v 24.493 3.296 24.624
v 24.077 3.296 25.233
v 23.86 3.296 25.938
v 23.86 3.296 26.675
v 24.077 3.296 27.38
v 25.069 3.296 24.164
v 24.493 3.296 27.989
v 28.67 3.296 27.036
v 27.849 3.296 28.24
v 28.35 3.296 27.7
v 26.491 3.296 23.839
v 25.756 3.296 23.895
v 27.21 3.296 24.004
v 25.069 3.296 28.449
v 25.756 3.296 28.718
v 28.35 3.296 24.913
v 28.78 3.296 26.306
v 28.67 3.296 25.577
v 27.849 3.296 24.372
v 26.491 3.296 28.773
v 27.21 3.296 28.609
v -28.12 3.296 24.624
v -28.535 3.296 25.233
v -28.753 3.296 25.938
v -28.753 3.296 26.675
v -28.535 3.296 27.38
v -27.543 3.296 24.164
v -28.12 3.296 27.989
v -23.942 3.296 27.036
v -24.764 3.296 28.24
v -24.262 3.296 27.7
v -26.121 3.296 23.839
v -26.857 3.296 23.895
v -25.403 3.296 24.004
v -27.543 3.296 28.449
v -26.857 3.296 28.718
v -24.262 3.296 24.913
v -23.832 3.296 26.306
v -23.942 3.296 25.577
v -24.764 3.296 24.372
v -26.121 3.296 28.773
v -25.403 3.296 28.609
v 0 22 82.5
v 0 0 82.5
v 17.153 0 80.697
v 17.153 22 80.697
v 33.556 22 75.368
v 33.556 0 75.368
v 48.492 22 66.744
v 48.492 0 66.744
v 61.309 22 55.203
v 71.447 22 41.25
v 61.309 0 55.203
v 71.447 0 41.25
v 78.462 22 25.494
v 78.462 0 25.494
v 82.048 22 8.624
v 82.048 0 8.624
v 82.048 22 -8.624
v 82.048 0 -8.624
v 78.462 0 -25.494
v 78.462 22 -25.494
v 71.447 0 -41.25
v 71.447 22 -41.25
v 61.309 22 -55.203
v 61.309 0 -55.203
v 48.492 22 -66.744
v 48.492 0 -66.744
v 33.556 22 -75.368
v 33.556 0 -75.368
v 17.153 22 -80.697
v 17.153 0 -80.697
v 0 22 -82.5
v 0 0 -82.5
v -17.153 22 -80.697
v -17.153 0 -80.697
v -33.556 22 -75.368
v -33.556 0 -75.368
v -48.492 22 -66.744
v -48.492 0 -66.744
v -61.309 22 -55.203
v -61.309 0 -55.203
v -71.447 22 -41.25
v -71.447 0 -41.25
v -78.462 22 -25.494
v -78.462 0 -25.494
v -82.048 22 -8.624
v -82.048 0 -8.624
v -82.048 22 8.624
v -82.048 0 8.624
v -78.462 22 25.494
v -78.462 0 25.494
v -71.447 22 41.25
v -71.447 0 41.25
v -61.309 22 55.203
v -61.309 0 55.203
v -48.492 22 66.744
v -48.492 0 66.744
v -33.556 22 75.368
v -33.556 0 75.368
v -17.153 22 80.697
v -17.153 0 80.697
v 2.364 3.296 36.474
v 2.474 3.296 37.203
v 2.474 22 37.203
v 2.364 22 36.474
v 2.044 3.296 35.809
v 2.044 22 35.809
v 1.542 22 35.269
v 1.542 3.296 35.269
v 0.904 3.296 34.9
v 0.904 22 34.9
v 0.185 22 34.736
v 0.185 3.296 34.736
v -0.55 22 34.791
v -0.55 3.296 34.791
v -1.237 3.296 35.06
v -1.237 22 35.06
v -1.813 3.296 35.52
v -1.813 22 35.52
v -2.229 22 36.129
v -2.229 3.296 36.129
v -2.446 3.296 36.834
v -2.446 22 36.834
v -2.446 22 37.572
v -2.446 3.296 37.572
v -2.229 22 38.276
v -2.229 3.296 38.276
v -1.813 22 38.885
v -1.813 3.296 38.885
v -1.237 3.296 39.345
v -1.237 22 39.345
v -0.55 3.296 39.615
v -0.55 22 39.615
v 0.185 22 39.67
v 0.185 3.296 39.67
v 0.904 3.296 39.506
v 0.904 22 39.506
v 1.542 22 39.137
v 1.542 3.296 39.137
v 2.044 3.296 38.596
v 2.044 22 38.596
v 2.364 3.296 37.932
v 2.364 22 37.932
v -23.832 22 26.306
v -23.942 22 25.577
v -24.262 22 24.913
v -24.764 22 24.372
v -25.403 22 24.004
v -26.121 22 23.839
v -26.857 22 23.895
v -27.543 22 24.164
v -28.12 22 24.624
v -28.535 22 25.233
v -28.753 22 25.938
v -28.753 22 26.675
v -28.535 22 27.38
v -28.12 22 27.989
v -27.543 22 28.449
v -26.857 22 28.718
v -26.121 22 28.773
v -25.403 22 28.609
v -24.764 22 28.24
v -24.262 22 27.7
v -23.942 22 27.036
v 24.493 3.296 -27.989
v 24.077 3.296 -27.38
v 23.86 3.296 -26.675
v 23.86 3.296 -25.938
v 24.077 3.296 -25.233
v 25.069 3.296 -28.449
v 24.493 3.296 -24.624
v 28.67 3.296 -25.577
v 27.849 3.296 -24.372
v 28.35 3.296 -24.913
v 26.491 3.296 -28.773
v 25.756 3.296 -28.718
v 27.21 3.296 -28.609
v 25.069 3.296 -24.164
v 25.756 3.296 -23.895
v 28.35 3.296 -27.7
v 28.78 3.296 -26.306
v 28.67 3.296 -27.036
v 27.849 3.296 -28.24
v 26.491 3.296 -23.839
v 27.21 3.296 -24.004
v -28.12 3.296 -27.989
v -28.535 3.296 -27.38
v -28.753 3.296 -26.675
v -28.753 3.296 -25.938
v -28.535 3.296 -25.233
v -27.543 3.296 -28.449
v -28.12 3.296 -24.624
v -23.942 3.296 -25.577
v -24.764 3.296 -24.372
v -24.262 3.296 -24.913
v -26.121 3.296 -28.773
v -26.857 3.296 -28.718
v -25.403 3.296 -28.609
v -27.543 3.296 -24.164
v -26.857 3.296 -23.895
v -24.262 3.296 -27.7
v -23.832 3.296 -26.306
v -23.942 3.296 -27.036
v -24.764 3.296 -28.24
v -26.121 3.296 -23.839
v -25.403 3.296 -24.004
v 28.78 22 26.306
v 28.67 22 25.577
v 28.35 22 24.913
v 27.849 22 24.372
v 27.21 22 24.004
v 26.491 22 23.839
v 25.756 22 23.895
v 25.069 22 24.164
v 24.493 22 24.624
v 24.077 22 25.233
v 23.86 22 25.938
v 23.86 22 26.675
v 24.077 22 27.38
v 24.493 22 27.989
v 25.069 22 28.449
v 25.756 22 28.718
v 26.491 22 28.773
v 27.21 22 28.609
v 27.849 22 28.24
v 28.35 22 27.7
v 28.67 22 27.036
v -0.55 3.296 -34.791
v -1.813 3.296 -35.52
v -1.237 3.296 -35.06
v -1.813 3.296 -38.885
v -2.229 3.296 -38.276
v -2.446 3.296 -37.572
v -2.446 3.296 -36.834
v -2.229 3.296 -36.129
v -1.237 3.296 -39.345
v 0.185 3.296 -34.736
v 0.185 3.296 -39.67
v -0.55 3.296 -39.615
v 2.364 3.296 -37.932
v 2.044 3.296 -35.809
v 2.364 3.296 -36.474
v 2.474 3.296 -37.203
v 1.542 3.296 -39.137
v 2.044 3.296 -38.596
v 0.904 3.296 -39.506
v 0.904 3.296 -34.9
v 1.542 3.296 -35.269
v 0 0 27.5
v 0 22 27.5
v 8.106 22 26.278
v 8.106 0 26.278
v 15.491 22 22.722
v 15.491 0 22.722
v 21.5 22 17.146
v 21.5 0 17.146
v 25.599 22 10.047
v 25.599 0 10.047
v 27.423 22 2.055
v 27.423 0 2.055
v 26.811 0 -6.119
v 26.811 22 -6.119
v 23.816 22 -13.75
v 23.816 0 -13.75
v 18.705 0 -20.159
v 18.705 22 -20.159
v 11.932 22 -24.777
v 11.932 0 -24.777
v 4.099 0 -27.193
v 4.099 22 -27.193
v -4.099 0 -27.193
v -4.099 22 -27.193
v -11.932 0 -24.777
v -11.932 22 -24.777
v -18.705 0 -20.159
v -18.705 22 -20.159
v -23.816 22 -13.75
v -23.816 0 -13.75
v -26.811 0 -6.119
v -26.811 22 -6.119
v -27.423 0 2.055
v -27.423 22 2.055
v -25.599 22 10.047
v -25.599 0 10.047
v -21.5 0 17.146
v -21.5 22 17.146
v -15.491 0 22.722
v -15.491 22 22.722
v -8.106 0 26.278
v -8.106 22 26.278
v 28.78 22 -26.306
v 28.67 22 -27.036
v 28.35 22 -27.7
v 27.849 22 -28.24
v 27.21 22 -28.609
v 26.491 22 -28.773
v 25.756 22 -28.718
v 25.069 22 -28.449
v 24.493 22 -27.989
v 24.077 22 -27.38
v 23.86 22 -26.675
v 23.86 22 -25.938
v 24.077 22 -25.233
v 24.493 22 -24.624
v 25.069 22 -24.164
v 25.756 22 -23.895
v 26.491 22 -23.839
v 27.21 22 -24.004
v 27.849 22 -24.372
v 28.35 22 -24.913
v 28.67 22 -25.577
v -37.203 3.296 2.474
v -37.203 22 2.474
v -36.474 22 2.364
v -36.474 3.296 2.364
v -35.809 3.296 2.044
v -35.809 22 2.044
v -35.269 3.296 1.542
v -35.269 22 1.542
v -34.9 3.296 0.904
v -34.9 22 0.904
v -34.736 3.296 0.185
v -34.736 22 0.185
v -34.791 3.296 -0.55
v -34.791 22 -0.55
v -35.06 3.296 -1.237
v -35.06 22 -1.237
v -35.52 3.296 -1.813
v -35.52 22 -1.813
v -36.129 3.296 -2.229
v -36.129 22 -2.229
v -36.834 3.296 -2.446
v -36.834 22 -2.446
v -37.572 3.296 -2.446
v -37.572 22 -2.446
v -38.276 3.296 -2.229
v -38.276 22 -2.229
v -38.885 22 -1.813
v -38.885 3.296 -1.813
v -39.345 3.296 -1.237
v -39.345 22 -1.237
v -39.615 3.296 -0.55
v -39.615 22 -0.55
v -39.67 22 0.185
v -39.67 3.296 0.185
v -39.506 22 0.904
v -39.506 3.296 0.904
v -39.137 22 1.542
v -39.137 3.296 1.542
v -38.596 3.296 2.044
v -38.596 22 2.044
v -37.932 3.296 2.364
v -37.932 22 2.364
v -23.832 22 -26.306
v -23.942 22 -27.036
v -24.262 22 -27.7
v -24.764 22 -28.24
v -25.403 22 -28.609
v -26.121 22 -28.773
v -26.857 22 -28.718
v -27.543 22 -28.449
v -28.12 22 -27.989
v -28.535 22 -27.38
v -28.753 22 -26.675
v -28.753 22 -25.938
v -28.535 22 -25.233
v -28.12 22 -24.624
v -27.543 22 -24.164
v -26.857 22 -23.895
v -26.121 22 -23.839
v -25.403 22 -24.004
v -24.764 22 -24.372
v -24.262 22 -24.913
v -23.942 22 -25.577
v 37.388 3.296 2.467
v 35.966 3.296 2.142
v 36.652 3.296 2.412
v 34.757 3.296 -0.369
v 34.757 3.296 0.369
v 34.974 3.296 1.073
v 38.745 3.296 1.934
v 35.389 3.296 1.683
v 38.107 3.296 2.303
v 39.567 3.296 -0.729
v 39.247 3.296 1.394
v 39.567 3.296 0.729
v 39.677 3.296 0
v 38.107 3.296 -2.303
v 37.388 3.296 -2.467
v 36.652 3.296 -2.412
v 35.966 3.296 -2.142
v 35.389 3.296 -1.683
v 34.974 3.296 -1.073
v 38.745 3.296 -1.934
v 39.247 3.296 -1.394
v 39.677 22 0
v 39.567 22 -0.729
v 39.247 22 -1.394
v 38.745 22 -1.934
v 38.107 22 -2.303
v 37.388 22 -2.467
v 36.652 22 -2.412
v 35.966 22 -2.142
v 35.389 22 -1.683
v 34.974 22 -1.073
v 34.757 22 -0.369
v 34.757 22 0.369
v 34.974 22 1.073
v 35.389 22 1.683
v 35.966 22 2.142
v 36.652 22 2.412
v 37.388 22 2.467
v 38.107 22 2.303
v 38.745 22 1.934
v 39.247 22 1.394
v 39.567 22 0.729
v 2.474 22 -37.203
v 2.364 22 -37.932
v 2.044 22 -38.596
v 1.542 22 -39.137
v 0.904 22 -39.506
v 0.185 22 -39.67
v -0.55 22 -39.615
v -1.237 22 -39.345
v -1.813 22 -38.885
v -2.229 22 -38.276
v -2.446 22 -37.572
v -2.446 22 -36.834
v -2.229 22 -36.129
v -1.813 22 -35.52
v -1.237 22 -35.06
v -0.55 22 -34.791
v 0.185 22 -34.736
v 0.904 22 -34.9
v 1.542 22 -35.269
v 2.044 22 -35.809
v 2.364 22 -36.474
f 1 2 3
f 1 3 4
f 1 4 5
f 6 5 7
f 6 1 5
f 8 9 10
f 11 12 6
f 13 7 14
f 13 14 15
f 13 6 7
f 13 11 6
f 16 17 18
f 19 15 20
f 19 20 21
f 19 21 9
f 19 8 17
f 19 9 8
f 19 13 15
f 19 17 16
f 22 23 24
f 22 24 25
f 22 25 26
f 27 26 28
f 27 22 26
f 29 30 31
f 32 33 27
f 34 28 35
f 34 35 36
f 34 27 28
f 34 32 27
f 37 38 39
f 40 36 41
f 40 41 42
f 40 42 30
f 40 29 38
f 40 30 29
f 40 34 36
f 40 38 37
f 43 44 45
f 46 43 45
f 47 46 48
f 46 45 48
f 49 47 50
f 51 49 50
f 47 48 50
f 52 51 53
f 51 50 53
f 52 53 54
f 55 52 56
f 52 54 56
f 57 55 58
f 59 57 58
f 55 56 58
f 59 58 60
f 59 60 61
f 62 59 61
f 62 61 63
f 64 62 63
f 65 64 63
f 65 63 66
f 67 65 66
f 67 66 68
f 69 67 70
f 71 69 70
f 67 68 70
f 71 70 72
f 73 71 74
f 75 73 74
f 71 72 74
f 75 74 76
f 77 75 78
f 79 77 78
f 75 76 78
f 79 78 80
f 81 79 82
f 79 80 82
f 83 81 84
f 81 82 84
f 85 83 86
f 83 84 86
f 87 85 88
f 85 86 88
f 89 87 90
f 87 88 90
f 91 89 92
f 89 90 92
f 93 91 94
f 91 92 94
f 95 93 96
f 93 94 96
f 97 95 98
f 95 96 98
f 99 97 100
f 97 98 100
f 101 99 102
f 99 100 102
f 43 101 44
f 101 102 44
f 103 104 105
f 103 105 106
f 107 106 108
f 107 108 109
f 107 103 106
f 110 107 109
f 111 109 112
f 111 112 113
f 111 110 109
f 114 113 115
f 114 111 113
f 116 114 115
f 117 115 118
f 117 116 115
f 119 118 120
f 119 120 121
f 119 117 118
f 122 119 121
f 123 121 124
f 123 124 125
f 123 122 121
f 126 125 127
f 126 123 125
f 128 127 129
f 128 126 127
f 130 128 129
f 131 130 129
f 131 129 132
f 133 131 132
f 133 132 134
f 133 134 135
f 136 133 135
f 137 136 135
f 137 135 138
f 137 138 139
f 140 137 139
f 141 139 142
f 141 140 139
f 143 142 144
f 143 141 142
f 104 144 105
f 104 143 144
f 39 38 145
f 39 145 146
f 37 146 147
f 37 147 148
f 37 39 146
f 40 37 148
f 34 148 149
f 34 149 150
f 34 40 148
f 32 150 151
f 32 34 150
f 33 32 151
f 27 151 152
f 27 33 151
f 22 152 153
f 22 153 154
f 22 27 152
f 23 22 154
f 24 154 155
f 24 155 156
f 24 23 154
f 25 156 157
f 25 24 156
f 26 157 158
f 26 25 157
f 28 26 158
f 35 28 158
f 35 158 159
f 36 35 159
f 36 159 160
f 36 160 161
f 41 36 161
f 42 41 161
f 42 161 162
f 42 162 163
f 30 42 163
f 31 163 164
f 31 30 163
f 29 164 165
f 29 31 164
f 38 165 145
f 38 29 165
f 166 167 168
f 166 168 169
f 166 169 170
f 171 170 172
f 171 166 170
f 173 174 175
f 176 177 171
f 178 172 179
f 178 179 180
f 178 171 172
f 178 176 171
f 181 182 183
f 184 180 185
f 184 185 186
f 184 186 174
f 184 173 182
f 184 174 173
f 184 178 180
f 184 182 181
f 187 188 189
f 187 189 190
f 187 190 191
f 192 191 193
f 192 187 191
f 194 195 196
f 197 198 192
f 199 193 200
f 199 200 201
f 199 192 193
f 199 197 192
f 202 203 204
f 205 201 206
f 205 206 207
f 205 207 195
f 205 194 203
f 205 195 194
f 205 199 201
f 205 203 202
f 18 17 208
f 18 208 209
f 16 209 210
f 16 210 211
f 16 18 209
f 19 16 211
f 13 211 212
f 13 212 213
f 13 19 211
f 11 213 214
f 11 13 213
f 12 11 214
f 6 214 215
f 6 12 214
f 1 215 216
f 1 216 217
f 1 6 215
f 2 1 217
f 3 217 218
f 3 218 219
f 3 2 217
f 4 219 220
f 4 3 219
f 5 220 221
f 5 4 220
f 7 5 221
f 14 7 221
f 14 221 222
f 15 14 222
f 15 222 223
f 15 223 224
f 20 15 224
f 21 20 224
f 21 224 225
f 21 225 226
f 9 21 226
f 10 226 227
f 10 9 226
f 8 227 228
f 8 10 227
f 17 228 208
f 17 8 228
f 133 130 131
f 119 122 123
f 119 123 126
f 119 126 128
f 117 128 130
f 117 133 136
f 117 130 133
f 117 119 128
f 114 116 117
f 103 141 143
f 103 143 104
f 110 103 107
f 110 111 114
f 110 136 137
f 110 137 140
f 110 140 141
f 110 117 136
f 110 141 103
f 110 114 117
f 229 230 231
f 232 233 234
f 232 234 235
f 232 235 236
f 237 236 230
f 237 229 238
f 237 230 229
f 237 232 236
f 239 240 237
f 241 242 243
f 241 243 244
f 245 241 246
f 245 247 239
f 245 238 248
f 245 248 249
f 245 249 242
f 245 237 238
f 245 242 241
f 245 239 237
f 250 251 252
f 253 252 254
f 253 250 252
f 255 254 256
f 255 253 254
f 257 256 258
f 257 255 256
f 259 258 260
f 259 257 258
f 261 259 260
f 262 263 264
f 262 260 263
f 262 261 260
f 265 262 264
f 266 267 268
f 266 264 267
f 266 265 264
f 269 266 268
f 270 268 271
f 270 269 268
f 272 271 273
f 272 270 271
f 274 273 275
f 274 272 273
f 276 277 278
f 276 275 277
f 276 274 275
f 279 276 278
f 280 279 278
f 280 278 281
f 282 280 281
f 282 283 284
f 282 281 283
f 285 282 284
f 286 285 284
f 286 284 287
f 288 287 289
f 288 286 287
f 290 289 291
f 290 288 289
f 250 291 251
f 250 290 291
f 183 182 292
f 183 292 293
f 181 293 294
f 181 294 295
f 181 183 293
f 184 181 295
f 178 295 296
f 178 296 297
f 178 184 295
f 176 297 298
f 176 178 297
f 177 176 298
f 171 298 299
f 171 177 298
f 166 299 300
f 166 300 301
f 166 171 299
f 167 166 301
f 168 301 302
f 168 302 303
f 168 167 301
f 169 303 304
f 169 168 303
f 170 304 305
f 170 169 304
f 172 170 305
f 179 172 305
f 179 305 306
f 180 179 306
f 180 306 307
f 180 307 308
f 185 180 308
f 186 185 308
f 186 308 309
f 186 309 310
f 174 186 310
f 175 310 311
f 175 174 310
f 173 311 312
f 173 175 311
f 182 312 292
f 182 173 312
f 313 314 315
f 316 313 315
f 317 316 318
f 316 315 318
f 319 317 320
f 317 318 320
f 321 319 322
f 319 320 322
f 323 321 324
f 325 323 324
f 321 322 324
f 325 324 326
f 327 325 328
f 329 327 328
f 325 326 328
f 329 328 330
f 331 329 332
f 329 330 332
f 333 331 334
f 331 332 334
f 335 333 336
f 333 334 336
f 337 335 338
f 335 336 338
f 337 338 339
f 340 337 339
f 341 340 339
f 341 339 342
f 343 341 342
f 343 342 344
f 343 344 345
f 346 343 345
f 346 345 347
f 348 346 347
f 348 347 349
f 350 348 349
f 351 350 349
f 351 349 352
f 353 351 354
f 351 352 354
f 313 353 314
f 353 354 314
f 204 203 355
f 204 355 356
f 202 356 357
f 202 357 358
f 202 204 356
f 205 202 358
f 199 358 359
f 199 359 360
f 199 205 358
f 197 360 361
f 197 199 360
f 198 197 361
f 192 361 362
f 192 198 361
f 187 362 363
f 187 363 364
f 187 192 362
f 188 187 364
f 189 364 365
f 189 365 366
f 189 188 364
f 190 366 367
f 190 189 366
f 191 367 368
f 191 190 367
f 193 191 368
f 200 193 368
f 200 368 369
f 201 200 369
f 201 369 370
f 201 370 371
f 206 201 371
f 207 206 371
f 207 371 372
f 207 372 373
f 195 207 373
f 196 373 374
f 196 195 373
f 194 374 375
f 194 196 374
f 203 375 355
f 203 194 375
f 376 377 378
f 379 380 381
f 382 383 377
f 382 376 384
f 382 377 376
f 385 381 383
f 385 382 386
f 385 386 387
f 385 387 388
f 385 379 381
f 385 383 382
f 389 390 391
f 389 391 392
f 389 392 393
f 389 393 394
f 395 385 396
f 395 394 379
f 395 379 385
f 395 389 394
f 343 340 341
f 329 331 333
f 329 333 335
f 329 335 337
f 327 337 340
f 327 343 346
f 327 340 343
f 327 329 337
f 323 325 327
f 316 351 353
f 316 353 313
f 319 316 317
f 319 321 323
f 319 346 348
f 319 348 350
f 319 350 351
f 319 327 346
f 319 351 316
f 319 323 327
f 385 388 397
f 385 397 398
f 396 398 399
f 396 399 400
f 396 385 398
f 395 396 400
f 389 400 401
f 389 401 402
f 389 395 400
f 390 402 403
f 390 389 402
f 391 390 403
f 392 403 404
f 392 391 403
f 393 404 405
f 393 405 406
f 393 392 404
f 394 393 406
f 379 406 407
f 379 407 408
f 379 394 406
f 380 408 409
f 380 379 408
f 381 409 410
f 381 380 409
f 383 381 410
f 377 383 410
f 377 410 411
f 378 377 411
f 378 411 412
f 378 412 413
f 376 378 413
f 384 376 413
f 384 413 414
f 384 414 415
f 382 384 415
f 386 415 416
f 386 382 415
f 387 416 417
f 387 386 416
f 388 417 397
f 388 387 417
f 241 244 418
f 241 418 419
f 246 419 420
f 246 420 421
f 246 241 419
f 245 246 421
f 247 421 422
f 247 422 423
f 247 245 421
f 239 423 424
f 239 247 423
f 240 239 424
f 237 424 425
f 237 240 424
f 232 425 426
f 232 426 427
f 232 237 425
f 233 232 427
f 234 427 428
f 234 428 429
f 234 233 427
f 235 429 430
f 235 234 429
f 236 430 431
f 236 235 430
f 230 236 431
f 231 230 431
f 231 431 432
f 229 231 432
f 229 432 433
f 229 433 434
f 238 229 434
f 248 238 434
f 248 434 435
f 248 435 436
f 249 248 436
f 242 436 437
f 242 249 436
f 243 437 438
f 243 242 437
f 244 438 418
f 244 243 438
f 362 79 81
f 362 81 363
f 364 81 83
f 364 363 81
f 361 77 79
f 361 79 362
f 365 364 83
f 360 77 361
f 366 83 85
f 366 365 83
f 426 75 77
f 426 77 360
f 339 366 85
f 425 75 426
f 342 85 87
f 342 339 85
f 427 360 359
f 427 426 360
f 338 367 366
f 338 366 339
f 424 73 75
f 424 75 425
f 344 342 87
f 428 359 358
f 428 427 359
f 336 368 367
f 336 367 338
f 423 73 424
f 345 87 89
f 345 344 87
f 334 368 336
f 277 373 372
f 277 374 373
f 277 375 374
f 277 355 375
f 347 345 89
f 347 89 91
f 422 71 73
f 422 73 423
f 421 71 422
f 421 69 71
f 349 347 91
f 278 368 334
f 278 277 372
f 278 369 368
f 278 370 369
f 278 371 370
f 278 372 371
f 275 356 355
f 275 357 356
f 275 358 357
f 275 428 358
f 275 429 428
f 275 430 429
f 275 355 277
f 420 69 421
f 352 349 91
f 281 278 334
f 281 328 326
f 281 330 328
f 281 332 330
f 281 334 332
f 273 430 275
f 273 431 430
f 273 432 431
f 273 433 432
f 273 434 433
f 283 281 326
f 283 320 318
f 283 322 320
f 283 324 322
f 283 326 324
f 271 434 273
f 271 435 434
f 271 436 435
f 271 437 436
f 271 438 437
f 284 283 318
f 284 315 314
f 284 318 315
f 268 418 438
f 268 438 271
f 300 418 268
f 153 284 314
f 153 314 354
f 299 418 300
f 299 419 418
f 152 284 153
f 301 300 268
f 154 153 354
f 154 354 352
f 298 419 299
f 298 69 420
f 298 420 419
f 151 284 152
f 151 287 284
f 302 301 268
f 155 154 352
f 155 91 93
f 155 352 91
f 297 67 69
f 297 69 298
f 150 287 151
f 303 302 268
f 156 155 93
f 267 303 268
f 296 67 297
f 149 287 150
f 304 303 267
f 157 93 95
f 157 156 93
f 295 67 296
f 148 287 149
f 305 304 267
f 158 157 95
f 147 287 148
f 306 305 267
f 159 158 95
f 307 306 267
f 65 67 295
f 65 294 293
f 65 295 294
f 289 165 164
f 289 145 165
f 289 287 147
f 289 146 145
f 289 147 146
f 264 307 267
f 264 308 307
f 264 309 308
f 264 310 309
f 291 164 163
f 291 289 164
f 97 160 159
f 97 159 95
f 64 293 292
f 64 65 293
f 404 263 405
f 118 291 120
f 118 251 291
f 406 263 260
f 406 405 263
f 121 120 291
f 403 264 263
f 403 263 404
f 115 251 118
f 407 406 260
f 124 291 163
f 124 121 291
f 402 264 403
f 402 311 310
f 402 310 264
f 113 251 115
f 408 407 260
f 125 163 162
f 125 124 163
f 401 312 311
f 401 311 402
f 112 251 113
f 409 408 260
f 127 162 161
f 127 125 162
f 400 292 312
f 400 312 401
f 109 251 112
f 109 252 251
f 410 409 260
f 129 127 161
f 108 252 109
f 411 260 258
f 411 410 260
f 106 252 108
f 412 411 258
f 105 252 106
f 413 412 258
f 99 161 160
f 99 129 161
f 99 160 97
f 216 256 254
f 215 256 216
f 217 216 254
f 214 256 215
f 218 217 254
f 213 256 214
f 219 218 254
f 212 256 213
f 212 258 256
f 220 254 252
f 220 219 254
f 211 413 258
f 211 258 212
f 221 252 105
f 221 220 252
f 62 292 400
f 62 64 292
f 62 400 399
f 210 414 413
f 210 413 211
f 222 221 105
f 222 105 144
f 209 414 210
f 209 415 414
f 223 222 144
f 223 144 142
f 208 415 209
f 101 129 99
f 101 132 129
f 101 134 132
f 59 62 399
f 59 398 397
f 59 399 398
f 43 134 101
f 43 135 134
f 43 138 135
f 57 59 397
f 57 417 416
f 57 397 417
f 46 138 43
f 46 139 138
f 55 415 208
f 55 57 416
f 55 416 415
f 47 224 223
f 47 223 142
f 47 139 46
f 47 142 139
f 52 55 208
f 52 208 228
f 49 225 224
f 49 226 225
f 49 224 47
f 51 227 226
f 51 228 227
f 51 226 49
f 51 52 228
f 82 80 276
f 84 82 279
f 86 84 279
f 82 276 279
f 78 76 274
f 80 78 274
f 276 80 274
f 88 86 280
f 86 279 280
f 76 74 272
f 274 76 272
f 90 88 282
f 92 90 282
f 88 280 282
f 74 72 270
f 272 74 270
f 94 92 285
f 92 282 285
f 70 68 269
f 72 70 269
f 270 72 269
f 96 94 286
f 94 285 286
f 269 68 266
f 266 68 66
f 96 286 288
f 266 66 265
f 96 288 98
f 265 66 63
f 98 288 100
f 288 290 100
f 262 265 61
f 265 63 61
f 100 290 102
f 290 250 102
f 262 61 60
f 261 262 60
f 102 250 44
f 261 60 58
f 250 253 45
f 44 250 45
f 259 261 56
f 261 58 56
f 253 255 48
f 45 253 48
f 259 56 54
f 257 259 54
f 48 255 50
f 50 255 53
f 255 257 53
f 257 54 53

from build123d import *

# Parameters (mm, degrees)
SKETCH1_R           = 82.5
BOSS_EXTRUDE1_DEPTH = 22
SKETCH2_R           = 27.5
CUT_EXTRUDE1_DEPTH  = 119.728682297
SKETCH3_R           = 2.473860502
CUT_EXTRUDE2_DEPTH  = 18.704156355
CIRPATTERN1_COUNT   = 8


with BuildPart() as part:
    # Sketch1 → Boss-Extrude1 (new body)
    with BuildSketch(Plane(origin=(0, 0, 0), x_dir=(1, 0, 0), z_dir=(0, 1, 0))):
        Circle(SKETCH1_R)
    extrude(amount=BOSS_EXTRUDE1_DEPTH)

    # Sketch2 → Cut-Extrude1 (cut, through all)
    with BuildSketch(Plane(origin=(0, 0, 0), x_dir=(1, 0, 0), z_dir=(0, 1, 0))):
        Circle(SKETCH2_R)
    extrude(amount=CUT_EXTRUDE1_DEPTH, mode=Mode.SUBTRACT)

    # Sketch3 → Cut-Extrude2 (cut)
    with BuildSketch(Plane(origin=(0, 22, 0), x_dir=(1, 0, 0), z_dir=(0, 1, 0))):
        with Locations((-37.202802875, 0)):
            Circle(SKETCH3_R)
    cut_extrude2 = extrude(amount=-CUT_EXTRUDE2_DEPTH, mode=Mode.SUBTRACT)

    # CirPattern1: Cut-Extrude2 ×8 about axis
    cirpattern1_axis = Axis((0, 0, 0), (0, 1, 0))
    for i in range(1, CIRPATTERN1_COUNT):
        add(cut_extrude2.rotate(cirpattern1_axis, i * 360 / CIRPATTERN1_COUNT), mode=Mode.SUBTRACT)


solid = part.part
